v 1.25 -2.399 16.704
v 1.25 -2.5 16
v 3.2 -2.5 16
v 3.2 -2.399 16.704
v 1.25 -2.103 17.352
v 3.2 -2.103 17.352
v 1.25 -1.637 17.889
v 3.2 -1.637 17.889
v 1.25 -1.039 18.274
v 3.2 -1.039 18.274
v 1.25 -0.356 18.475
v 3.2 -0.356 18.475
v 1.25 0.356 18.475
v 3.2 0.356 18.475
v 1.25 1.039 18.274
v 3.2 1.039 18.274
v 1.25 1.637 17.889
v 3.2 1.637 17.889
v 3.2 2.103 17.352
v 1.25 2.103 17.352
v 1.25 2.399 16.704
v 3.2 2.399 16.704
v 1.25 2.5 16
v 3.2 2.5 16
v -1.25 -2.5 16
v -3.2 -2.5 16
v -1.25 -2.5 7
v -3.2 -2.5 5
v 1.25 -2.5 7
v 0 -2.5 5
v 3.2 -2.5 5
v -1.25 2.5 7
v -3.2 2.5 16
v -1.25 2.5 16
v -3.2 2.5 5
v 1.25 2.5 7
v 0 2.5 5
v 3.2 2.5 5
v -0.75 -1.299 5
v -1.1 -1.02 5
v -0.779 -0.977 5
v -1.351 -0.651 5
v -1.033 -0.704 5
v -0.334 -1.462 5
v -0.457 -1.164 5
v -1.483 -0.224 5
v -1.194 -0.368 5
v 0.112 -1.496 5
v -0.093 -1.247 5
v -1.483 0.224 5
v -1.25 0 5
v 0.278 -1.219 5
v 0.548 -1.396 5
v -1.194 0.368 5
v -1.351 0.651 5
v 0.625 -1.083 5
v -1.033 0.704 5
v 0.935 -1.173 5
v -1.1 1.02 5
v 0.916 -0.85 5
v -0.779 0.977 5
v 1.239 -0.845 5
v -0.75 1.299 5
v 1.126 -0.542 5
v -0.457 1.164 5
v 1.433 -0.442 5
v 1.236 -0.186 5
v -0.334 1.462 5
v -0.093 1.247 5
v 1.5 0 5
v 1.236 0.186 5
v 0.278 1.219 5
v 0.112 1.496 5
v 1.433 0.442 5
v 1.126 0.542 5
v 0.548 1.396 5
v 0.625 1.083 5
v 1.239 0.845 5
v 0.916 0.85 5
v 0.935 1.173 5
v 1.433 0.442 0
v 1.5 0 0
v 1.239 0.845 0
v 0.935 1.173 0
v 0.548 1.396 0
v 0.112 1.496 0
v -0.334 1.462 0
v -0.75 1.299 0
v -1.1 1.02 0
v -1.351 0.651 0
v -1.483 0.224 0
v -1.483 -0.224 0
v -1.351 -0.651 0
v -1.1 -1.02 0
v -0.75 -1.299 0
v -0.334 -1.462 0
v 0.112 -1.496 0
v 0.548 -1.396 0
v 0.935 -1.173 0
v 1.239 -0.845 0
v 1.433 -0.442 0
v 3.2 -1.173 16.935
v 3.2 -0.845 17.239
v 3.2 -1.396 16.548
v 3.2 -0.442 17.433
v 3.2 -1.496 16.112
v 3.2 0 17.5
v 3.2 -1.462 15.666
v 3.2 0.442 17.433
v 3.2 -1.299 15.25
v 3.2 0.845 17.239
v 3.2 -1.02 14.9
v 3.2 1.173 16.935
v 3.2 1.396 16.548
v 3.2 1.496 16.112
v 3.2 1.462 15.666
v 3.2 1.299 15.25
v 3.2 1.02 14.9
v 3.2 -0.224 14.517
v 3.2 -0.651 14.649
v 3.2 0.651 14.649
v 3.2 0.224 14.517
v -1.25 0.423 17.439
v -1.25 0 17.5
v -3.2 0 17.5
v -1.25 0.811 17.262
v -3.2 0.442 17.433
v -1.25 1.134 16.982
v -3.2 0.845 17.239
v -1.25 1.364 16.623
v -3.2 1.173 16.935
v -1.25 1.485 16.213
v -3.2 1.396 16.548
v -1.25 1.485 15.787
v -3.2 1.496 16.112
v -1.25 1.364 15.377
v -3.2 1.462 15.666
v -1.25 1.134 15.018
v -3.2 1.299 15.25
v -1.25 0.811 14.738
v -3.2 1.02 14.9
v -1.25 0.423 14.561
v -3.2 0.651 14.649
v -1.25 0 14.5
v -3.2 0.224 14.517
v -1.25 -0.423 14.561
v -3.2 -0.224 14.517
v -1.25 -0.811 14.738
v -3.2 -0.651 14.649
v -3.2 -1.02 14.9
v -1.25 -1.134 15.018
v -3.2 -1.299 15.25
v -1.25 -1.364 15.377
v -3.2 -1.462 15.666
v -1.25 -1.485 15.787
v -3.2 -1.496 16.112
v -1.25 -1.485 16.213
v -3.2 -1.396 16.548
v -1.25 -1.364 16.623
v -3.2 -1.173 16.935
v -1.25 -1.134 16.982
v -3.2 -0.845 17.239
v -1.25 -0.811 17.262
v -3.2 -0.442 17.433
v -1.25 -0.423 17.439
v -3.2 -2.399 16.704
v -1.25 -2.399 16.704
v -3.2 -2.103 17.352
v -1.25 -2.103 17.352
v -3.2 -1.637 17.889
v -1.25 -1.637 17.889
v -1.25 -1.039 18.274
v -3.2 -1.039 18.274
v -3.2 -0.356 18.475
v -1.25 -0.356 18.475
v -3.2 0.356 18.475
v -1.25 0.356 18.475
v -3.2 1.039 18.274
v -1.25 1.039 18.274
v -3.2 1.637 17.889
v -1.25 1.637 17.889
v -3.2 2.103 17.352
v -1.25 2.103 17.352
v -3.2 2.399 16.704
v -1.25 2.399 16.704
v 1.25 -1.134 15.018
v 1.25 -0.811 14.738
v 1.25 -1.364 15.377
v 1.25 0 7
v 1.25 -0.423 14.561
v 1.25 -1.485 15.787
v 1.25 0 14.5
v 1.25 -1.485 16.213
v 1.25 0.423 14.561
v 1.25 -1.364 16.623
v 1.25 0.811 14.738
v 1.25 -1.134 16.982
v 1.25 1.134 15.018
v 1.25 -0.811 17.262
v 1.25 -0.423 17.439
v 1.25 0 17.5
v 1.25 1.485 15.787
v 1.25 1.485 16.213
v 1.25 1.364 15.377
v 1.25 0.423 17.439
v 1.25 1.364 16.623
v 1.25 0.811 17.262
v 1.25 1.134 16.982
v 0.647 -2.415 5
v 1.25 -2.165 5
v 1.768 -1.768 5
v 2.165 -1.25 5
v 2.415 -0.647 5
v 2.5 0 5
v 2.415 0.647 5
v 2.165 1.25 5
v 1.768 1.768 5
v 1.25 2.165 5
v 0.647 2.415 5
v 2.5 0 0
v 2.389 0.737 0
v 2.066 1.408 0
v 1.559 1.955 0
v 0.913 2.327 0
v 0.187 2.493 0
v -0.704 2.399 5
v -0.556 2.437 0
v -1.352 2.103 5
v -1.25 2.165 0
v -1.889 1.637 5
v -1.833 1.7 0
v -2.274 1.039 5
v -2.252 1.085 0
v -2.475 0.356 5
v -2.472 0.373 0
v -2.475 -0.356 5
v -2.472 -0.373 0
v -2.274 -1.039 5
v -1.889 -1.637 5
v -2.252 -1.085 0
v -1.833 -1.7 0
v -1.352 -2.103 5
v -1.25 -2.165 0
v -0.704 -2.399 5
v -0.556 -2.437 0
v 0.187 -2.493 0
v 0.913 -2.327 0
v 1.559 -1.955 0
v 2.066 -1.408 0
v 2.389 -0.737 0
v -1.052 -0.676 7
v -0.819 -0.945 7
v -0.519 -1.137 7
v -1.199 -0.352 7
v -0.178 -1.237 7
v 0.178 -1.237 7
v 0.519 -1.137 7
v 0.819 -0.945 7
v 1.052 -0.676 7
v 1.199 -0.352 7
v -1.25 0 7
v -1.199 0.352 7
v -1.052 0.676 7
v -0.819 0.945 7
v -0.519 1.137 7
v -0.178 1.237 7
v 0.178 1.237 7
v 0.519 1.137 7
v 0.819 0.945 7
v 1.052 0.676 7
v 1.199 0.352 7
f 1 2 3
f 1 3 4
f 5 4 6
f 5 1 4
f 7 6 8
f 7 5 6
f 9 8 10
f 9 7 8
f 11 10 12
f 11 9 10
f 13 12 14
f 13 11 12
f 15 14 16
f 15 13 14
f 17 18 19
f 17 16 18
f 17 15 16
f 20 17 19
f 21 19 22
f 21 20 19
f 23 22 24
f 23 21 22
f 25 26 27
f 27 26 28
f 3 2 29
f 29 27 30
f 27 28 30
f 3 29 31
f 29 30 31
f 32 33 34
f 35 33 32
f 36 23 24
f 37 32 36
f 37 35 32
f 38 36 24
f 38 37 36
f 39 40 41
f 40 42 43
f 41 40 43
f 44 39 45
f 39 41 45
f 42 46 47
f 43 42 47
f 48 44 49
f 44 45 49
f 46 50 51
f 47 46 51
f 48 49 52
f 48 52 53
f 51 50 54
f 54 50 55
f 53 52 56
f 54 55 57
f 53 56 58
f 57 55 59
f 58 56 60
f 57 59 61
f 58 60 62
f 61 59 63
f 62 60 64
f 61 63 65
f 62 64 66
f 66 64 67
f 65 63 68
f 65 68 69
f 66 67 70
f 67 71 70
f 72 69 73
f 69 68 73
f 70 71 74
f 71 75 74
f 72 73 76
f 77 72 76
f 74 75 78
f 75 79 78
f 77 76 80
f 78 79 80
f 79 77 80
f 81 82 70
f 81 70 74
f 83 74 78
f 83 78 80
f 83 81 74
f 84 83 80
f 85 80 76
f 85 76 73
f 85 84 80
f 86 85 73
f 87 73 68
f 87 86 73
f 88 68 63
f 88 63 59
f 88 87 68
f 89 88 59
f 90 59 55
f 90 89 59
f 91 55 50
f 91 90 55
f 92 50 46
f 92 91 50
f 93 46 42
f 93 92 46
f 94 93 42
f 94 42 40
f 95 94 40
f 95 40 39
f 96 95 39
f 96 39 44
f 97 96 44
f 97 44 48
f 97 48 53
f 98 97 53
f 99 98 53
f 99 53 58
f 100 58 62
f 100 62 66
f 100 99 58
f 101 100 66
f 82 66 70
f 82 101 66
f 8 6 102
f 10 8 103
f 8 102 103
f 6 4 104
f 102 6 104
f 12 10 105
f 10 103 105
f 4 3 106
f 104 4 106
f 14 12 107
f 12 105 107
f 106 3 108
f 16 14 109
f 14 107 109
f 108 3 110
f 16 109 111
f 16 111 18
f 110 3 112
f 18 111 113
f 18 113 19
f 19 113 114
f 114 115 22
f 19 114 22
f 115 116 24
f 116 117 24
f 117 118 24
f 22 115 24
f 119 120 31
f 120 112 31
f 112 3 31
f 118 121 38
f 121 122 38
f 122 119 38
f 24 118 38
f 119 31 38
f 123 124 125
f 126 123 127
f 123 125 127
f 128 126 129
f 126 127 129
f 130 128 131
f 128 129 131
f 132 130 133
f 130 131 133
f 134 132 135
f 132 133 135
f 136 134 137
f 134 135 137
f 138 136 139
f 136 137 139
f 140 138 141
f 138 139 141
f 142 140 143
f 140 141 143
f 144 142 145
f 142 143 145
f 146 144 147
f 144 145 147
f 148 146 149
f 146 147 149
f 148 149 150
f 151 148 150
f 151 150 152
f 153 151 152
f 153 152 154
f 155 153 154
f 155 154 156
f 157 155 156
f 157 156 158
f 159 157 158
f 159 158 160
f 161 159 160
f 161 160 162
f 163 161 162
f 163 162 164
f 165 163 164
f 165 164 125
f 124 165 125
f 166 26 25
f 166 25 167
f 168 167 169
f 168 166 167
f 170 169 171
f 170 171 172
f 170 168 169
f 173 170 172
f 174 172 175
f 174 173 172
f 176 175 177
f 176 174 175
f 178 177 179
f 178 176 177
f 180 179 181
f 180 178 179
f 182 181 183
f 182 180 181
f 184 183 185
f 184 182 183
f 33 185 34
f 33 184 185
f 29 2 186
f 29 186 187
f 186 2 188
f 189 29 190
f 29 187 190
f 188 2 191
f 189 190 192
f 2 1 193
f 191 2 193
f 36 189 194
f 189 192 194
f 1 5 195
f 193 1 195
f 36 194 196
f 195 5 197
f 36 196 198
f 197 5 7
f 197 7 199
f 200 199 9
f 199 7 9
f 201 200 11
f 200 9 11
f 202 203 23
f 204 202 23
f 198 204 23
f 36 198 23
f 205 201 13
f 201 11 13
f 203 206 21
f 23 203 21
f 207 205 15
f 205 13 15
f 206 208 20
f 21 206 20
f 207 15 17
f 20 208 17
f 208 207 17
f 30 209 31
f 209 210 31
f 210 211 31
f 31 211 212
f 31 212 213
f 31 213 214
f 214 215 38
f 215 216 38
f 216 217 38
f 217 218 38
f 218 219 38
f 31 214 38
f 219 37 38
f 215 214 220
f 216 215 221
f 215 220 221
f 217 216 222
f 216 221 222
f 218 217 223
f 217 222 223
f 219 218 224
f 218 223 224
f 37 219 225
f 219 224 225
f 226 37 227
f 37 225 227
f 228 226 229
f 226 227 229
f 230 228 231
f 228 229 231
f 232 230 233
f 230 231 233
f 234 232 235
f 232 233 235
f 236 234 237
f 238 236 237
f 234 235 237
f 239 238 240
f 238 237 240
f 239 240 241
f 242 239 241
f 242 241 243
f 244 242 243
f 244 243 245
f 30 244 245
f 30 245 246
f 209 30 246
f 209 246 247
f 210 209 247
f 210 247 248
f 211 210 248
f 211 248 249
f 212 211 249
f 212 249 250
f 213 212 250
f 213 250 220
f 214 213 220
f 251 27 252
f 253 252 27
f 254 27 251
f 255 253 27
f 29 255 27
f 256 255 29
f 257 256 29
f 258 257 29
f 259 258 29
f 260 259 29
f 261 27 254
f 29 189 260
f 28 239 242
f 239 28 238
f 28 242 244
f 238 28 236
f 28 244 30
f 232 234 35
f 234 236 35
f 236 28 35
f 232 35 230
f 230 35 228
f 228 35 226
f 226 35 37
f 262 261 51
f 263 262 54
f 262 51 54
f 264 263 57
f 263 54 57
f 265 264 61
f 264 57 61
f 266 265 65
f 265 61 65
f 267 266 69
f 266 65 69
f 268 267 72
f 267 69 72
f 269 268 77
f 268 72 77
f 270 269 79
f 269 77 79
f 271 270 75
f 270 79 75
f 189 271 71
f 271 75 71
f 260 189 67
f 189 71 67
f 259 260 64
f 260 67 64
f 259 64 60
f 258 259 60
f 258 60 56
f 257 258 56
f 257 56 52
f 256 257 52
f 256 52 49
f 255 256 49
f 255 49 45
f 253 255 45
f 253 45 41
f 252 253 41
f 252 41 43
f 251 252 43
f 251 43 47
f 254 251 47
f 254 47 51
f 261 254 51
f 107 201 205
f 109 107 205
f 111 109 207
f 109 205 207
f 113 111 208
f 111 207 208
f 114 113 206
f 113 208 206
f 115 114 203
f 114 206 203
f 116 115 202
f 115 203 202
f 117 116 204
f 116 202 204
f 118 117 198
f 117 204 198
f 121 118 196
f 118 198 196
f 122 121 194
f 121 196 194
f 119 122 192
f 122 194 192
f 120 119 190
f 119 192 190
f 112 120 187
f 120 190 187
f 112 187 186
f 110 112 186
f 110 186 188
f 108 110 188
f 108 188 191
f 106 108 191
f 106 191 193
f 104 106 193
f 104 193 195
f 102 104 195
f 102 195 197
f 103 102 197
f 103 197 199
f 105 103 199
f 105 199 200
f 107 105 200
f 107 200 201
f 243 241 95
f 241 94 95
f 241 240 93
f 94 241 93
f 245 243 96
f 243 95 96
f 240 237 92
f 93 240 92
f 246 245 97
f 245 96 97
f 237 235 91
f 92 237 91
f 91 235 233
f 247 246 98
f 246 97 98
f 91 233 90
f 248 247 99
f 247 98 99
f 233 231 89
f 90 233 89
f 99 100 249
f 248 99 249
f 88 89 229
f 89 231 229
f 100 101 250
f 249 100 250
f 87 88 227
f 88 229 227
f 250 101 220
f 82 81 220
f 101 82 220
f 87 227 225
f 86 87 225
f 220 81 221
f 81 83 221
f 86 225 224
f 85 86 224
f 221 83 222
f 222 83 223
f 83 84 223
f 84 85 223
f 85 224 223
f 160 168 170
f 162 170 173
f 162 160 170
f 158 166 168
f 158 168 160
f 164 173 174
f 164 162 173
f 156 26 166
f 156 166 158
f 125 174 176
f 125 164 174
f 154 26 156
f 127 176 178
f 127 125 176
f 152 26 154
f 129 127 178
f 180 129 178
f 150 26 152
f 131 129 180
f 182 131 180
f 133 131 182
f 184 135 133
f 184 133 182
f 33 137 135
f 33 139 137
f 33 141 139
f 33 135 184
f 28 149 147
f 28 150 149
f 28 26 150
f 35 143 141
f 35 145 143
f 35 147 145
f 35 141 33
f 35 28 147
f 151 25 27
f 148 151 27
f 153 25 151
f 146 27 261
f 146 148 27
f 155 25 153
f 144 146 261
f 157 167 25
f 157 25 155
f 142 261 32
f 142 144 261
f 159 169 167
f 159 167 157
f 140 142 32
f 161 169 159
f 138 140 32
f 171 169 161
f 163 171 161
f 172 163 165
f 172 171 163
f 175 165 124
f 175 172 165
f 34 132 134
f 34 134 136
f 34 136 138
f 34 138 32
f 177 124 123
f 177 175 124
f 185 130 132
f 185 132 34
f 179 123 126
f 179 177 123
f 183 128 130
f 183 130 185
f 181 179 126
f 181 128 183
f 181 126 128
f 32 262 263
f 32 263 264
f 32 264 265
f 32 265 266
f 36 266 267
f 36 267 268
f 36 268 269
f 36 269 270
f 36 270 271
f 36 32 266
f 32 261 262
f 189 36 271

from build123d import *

# Parameters (mm, degrees)
SKETCH1_R           = 2.5
SKETCH1_R_2         = 1.5
BOSS_EXTRUDE1_DEPTH = 5
SKETCH2_W           = 6.4
SKETCH2_H           = 5
BOSS_EXTRUDE2_DEPTH = 13.5
SKETCH3_W           = 2.5
SKETCH3_H           = 5
CUT_EXTRUDE1_DEPTH  = 11.5
SKETCH4_R           = 1.5
CUT_EXTRUDE2_DEPTH  = 7
SKETCH_2_R          = 1.25
CUT_EXTRUDE_1_DEPTH = 10


with BuildPart() as part:
    # Sketch1 → Boss-Extrude1 (new body)
    with BuildSketch(Plane.XY):
        Circle(SKETCH1_R)
        Circle(SKETCH1_R_2, mode=Mode.SUBTRACT)
    extrude(amount=BOSS_EXTRUDE1_DEPTH)

    # Sketch2 → Boss-Extrude2 (add)
    with BuildSketch(Plane.XY.offset(5)):
        Rectangle(SKETCH2_W, SKETCH2_H)
    extrude(amount=BOSS_EXTRUDE2_DEPTH)

    # Sketch3 → Cut-Extrude1 (cut)
    with BuildSketch(Plane.XY.offset(18.5)):
        Rectangle(SKETCH3_W, SKETCH3_H)
    extrude(amount=-CUT_EXTRUDE1_DEPTH, mode=Mode.SUBTRACT)

    # Sketch4 → Cut-Extrude2 (cut)
    with BuildSketch(Plane.ZY.offset(3.2)):
        with Locations((16, 0)):
            Circle(SKETCH4_R)
        with BuildLine():
            Line((16, 2.5), (20, 2.5))
            Line((20, 2.5), (20, -2.5))
            Line((20, -2.5), (16, -2.5))
            ThreePointArc((16, -2.5), (18.5, 0), (16, 2.5))
        make_face()
    extrude(amount=-CUT_EXTRUDE2_DEPTH, mode=Mode.SUBTRACT)

    # 草图2 → 切除-拉伸1 (cut)
    with BuildSketch(Plane(origin=(0, 0, 5), x_dir=(-1, 0, 0), z_dir=(0, 0, -1))):
        Circle(SKETCH_2_R)
    extrude(amount=-CUT_EXTRUDE_1_DEPTH, mode=Mode.SUBTRACT)


solid = part.part
